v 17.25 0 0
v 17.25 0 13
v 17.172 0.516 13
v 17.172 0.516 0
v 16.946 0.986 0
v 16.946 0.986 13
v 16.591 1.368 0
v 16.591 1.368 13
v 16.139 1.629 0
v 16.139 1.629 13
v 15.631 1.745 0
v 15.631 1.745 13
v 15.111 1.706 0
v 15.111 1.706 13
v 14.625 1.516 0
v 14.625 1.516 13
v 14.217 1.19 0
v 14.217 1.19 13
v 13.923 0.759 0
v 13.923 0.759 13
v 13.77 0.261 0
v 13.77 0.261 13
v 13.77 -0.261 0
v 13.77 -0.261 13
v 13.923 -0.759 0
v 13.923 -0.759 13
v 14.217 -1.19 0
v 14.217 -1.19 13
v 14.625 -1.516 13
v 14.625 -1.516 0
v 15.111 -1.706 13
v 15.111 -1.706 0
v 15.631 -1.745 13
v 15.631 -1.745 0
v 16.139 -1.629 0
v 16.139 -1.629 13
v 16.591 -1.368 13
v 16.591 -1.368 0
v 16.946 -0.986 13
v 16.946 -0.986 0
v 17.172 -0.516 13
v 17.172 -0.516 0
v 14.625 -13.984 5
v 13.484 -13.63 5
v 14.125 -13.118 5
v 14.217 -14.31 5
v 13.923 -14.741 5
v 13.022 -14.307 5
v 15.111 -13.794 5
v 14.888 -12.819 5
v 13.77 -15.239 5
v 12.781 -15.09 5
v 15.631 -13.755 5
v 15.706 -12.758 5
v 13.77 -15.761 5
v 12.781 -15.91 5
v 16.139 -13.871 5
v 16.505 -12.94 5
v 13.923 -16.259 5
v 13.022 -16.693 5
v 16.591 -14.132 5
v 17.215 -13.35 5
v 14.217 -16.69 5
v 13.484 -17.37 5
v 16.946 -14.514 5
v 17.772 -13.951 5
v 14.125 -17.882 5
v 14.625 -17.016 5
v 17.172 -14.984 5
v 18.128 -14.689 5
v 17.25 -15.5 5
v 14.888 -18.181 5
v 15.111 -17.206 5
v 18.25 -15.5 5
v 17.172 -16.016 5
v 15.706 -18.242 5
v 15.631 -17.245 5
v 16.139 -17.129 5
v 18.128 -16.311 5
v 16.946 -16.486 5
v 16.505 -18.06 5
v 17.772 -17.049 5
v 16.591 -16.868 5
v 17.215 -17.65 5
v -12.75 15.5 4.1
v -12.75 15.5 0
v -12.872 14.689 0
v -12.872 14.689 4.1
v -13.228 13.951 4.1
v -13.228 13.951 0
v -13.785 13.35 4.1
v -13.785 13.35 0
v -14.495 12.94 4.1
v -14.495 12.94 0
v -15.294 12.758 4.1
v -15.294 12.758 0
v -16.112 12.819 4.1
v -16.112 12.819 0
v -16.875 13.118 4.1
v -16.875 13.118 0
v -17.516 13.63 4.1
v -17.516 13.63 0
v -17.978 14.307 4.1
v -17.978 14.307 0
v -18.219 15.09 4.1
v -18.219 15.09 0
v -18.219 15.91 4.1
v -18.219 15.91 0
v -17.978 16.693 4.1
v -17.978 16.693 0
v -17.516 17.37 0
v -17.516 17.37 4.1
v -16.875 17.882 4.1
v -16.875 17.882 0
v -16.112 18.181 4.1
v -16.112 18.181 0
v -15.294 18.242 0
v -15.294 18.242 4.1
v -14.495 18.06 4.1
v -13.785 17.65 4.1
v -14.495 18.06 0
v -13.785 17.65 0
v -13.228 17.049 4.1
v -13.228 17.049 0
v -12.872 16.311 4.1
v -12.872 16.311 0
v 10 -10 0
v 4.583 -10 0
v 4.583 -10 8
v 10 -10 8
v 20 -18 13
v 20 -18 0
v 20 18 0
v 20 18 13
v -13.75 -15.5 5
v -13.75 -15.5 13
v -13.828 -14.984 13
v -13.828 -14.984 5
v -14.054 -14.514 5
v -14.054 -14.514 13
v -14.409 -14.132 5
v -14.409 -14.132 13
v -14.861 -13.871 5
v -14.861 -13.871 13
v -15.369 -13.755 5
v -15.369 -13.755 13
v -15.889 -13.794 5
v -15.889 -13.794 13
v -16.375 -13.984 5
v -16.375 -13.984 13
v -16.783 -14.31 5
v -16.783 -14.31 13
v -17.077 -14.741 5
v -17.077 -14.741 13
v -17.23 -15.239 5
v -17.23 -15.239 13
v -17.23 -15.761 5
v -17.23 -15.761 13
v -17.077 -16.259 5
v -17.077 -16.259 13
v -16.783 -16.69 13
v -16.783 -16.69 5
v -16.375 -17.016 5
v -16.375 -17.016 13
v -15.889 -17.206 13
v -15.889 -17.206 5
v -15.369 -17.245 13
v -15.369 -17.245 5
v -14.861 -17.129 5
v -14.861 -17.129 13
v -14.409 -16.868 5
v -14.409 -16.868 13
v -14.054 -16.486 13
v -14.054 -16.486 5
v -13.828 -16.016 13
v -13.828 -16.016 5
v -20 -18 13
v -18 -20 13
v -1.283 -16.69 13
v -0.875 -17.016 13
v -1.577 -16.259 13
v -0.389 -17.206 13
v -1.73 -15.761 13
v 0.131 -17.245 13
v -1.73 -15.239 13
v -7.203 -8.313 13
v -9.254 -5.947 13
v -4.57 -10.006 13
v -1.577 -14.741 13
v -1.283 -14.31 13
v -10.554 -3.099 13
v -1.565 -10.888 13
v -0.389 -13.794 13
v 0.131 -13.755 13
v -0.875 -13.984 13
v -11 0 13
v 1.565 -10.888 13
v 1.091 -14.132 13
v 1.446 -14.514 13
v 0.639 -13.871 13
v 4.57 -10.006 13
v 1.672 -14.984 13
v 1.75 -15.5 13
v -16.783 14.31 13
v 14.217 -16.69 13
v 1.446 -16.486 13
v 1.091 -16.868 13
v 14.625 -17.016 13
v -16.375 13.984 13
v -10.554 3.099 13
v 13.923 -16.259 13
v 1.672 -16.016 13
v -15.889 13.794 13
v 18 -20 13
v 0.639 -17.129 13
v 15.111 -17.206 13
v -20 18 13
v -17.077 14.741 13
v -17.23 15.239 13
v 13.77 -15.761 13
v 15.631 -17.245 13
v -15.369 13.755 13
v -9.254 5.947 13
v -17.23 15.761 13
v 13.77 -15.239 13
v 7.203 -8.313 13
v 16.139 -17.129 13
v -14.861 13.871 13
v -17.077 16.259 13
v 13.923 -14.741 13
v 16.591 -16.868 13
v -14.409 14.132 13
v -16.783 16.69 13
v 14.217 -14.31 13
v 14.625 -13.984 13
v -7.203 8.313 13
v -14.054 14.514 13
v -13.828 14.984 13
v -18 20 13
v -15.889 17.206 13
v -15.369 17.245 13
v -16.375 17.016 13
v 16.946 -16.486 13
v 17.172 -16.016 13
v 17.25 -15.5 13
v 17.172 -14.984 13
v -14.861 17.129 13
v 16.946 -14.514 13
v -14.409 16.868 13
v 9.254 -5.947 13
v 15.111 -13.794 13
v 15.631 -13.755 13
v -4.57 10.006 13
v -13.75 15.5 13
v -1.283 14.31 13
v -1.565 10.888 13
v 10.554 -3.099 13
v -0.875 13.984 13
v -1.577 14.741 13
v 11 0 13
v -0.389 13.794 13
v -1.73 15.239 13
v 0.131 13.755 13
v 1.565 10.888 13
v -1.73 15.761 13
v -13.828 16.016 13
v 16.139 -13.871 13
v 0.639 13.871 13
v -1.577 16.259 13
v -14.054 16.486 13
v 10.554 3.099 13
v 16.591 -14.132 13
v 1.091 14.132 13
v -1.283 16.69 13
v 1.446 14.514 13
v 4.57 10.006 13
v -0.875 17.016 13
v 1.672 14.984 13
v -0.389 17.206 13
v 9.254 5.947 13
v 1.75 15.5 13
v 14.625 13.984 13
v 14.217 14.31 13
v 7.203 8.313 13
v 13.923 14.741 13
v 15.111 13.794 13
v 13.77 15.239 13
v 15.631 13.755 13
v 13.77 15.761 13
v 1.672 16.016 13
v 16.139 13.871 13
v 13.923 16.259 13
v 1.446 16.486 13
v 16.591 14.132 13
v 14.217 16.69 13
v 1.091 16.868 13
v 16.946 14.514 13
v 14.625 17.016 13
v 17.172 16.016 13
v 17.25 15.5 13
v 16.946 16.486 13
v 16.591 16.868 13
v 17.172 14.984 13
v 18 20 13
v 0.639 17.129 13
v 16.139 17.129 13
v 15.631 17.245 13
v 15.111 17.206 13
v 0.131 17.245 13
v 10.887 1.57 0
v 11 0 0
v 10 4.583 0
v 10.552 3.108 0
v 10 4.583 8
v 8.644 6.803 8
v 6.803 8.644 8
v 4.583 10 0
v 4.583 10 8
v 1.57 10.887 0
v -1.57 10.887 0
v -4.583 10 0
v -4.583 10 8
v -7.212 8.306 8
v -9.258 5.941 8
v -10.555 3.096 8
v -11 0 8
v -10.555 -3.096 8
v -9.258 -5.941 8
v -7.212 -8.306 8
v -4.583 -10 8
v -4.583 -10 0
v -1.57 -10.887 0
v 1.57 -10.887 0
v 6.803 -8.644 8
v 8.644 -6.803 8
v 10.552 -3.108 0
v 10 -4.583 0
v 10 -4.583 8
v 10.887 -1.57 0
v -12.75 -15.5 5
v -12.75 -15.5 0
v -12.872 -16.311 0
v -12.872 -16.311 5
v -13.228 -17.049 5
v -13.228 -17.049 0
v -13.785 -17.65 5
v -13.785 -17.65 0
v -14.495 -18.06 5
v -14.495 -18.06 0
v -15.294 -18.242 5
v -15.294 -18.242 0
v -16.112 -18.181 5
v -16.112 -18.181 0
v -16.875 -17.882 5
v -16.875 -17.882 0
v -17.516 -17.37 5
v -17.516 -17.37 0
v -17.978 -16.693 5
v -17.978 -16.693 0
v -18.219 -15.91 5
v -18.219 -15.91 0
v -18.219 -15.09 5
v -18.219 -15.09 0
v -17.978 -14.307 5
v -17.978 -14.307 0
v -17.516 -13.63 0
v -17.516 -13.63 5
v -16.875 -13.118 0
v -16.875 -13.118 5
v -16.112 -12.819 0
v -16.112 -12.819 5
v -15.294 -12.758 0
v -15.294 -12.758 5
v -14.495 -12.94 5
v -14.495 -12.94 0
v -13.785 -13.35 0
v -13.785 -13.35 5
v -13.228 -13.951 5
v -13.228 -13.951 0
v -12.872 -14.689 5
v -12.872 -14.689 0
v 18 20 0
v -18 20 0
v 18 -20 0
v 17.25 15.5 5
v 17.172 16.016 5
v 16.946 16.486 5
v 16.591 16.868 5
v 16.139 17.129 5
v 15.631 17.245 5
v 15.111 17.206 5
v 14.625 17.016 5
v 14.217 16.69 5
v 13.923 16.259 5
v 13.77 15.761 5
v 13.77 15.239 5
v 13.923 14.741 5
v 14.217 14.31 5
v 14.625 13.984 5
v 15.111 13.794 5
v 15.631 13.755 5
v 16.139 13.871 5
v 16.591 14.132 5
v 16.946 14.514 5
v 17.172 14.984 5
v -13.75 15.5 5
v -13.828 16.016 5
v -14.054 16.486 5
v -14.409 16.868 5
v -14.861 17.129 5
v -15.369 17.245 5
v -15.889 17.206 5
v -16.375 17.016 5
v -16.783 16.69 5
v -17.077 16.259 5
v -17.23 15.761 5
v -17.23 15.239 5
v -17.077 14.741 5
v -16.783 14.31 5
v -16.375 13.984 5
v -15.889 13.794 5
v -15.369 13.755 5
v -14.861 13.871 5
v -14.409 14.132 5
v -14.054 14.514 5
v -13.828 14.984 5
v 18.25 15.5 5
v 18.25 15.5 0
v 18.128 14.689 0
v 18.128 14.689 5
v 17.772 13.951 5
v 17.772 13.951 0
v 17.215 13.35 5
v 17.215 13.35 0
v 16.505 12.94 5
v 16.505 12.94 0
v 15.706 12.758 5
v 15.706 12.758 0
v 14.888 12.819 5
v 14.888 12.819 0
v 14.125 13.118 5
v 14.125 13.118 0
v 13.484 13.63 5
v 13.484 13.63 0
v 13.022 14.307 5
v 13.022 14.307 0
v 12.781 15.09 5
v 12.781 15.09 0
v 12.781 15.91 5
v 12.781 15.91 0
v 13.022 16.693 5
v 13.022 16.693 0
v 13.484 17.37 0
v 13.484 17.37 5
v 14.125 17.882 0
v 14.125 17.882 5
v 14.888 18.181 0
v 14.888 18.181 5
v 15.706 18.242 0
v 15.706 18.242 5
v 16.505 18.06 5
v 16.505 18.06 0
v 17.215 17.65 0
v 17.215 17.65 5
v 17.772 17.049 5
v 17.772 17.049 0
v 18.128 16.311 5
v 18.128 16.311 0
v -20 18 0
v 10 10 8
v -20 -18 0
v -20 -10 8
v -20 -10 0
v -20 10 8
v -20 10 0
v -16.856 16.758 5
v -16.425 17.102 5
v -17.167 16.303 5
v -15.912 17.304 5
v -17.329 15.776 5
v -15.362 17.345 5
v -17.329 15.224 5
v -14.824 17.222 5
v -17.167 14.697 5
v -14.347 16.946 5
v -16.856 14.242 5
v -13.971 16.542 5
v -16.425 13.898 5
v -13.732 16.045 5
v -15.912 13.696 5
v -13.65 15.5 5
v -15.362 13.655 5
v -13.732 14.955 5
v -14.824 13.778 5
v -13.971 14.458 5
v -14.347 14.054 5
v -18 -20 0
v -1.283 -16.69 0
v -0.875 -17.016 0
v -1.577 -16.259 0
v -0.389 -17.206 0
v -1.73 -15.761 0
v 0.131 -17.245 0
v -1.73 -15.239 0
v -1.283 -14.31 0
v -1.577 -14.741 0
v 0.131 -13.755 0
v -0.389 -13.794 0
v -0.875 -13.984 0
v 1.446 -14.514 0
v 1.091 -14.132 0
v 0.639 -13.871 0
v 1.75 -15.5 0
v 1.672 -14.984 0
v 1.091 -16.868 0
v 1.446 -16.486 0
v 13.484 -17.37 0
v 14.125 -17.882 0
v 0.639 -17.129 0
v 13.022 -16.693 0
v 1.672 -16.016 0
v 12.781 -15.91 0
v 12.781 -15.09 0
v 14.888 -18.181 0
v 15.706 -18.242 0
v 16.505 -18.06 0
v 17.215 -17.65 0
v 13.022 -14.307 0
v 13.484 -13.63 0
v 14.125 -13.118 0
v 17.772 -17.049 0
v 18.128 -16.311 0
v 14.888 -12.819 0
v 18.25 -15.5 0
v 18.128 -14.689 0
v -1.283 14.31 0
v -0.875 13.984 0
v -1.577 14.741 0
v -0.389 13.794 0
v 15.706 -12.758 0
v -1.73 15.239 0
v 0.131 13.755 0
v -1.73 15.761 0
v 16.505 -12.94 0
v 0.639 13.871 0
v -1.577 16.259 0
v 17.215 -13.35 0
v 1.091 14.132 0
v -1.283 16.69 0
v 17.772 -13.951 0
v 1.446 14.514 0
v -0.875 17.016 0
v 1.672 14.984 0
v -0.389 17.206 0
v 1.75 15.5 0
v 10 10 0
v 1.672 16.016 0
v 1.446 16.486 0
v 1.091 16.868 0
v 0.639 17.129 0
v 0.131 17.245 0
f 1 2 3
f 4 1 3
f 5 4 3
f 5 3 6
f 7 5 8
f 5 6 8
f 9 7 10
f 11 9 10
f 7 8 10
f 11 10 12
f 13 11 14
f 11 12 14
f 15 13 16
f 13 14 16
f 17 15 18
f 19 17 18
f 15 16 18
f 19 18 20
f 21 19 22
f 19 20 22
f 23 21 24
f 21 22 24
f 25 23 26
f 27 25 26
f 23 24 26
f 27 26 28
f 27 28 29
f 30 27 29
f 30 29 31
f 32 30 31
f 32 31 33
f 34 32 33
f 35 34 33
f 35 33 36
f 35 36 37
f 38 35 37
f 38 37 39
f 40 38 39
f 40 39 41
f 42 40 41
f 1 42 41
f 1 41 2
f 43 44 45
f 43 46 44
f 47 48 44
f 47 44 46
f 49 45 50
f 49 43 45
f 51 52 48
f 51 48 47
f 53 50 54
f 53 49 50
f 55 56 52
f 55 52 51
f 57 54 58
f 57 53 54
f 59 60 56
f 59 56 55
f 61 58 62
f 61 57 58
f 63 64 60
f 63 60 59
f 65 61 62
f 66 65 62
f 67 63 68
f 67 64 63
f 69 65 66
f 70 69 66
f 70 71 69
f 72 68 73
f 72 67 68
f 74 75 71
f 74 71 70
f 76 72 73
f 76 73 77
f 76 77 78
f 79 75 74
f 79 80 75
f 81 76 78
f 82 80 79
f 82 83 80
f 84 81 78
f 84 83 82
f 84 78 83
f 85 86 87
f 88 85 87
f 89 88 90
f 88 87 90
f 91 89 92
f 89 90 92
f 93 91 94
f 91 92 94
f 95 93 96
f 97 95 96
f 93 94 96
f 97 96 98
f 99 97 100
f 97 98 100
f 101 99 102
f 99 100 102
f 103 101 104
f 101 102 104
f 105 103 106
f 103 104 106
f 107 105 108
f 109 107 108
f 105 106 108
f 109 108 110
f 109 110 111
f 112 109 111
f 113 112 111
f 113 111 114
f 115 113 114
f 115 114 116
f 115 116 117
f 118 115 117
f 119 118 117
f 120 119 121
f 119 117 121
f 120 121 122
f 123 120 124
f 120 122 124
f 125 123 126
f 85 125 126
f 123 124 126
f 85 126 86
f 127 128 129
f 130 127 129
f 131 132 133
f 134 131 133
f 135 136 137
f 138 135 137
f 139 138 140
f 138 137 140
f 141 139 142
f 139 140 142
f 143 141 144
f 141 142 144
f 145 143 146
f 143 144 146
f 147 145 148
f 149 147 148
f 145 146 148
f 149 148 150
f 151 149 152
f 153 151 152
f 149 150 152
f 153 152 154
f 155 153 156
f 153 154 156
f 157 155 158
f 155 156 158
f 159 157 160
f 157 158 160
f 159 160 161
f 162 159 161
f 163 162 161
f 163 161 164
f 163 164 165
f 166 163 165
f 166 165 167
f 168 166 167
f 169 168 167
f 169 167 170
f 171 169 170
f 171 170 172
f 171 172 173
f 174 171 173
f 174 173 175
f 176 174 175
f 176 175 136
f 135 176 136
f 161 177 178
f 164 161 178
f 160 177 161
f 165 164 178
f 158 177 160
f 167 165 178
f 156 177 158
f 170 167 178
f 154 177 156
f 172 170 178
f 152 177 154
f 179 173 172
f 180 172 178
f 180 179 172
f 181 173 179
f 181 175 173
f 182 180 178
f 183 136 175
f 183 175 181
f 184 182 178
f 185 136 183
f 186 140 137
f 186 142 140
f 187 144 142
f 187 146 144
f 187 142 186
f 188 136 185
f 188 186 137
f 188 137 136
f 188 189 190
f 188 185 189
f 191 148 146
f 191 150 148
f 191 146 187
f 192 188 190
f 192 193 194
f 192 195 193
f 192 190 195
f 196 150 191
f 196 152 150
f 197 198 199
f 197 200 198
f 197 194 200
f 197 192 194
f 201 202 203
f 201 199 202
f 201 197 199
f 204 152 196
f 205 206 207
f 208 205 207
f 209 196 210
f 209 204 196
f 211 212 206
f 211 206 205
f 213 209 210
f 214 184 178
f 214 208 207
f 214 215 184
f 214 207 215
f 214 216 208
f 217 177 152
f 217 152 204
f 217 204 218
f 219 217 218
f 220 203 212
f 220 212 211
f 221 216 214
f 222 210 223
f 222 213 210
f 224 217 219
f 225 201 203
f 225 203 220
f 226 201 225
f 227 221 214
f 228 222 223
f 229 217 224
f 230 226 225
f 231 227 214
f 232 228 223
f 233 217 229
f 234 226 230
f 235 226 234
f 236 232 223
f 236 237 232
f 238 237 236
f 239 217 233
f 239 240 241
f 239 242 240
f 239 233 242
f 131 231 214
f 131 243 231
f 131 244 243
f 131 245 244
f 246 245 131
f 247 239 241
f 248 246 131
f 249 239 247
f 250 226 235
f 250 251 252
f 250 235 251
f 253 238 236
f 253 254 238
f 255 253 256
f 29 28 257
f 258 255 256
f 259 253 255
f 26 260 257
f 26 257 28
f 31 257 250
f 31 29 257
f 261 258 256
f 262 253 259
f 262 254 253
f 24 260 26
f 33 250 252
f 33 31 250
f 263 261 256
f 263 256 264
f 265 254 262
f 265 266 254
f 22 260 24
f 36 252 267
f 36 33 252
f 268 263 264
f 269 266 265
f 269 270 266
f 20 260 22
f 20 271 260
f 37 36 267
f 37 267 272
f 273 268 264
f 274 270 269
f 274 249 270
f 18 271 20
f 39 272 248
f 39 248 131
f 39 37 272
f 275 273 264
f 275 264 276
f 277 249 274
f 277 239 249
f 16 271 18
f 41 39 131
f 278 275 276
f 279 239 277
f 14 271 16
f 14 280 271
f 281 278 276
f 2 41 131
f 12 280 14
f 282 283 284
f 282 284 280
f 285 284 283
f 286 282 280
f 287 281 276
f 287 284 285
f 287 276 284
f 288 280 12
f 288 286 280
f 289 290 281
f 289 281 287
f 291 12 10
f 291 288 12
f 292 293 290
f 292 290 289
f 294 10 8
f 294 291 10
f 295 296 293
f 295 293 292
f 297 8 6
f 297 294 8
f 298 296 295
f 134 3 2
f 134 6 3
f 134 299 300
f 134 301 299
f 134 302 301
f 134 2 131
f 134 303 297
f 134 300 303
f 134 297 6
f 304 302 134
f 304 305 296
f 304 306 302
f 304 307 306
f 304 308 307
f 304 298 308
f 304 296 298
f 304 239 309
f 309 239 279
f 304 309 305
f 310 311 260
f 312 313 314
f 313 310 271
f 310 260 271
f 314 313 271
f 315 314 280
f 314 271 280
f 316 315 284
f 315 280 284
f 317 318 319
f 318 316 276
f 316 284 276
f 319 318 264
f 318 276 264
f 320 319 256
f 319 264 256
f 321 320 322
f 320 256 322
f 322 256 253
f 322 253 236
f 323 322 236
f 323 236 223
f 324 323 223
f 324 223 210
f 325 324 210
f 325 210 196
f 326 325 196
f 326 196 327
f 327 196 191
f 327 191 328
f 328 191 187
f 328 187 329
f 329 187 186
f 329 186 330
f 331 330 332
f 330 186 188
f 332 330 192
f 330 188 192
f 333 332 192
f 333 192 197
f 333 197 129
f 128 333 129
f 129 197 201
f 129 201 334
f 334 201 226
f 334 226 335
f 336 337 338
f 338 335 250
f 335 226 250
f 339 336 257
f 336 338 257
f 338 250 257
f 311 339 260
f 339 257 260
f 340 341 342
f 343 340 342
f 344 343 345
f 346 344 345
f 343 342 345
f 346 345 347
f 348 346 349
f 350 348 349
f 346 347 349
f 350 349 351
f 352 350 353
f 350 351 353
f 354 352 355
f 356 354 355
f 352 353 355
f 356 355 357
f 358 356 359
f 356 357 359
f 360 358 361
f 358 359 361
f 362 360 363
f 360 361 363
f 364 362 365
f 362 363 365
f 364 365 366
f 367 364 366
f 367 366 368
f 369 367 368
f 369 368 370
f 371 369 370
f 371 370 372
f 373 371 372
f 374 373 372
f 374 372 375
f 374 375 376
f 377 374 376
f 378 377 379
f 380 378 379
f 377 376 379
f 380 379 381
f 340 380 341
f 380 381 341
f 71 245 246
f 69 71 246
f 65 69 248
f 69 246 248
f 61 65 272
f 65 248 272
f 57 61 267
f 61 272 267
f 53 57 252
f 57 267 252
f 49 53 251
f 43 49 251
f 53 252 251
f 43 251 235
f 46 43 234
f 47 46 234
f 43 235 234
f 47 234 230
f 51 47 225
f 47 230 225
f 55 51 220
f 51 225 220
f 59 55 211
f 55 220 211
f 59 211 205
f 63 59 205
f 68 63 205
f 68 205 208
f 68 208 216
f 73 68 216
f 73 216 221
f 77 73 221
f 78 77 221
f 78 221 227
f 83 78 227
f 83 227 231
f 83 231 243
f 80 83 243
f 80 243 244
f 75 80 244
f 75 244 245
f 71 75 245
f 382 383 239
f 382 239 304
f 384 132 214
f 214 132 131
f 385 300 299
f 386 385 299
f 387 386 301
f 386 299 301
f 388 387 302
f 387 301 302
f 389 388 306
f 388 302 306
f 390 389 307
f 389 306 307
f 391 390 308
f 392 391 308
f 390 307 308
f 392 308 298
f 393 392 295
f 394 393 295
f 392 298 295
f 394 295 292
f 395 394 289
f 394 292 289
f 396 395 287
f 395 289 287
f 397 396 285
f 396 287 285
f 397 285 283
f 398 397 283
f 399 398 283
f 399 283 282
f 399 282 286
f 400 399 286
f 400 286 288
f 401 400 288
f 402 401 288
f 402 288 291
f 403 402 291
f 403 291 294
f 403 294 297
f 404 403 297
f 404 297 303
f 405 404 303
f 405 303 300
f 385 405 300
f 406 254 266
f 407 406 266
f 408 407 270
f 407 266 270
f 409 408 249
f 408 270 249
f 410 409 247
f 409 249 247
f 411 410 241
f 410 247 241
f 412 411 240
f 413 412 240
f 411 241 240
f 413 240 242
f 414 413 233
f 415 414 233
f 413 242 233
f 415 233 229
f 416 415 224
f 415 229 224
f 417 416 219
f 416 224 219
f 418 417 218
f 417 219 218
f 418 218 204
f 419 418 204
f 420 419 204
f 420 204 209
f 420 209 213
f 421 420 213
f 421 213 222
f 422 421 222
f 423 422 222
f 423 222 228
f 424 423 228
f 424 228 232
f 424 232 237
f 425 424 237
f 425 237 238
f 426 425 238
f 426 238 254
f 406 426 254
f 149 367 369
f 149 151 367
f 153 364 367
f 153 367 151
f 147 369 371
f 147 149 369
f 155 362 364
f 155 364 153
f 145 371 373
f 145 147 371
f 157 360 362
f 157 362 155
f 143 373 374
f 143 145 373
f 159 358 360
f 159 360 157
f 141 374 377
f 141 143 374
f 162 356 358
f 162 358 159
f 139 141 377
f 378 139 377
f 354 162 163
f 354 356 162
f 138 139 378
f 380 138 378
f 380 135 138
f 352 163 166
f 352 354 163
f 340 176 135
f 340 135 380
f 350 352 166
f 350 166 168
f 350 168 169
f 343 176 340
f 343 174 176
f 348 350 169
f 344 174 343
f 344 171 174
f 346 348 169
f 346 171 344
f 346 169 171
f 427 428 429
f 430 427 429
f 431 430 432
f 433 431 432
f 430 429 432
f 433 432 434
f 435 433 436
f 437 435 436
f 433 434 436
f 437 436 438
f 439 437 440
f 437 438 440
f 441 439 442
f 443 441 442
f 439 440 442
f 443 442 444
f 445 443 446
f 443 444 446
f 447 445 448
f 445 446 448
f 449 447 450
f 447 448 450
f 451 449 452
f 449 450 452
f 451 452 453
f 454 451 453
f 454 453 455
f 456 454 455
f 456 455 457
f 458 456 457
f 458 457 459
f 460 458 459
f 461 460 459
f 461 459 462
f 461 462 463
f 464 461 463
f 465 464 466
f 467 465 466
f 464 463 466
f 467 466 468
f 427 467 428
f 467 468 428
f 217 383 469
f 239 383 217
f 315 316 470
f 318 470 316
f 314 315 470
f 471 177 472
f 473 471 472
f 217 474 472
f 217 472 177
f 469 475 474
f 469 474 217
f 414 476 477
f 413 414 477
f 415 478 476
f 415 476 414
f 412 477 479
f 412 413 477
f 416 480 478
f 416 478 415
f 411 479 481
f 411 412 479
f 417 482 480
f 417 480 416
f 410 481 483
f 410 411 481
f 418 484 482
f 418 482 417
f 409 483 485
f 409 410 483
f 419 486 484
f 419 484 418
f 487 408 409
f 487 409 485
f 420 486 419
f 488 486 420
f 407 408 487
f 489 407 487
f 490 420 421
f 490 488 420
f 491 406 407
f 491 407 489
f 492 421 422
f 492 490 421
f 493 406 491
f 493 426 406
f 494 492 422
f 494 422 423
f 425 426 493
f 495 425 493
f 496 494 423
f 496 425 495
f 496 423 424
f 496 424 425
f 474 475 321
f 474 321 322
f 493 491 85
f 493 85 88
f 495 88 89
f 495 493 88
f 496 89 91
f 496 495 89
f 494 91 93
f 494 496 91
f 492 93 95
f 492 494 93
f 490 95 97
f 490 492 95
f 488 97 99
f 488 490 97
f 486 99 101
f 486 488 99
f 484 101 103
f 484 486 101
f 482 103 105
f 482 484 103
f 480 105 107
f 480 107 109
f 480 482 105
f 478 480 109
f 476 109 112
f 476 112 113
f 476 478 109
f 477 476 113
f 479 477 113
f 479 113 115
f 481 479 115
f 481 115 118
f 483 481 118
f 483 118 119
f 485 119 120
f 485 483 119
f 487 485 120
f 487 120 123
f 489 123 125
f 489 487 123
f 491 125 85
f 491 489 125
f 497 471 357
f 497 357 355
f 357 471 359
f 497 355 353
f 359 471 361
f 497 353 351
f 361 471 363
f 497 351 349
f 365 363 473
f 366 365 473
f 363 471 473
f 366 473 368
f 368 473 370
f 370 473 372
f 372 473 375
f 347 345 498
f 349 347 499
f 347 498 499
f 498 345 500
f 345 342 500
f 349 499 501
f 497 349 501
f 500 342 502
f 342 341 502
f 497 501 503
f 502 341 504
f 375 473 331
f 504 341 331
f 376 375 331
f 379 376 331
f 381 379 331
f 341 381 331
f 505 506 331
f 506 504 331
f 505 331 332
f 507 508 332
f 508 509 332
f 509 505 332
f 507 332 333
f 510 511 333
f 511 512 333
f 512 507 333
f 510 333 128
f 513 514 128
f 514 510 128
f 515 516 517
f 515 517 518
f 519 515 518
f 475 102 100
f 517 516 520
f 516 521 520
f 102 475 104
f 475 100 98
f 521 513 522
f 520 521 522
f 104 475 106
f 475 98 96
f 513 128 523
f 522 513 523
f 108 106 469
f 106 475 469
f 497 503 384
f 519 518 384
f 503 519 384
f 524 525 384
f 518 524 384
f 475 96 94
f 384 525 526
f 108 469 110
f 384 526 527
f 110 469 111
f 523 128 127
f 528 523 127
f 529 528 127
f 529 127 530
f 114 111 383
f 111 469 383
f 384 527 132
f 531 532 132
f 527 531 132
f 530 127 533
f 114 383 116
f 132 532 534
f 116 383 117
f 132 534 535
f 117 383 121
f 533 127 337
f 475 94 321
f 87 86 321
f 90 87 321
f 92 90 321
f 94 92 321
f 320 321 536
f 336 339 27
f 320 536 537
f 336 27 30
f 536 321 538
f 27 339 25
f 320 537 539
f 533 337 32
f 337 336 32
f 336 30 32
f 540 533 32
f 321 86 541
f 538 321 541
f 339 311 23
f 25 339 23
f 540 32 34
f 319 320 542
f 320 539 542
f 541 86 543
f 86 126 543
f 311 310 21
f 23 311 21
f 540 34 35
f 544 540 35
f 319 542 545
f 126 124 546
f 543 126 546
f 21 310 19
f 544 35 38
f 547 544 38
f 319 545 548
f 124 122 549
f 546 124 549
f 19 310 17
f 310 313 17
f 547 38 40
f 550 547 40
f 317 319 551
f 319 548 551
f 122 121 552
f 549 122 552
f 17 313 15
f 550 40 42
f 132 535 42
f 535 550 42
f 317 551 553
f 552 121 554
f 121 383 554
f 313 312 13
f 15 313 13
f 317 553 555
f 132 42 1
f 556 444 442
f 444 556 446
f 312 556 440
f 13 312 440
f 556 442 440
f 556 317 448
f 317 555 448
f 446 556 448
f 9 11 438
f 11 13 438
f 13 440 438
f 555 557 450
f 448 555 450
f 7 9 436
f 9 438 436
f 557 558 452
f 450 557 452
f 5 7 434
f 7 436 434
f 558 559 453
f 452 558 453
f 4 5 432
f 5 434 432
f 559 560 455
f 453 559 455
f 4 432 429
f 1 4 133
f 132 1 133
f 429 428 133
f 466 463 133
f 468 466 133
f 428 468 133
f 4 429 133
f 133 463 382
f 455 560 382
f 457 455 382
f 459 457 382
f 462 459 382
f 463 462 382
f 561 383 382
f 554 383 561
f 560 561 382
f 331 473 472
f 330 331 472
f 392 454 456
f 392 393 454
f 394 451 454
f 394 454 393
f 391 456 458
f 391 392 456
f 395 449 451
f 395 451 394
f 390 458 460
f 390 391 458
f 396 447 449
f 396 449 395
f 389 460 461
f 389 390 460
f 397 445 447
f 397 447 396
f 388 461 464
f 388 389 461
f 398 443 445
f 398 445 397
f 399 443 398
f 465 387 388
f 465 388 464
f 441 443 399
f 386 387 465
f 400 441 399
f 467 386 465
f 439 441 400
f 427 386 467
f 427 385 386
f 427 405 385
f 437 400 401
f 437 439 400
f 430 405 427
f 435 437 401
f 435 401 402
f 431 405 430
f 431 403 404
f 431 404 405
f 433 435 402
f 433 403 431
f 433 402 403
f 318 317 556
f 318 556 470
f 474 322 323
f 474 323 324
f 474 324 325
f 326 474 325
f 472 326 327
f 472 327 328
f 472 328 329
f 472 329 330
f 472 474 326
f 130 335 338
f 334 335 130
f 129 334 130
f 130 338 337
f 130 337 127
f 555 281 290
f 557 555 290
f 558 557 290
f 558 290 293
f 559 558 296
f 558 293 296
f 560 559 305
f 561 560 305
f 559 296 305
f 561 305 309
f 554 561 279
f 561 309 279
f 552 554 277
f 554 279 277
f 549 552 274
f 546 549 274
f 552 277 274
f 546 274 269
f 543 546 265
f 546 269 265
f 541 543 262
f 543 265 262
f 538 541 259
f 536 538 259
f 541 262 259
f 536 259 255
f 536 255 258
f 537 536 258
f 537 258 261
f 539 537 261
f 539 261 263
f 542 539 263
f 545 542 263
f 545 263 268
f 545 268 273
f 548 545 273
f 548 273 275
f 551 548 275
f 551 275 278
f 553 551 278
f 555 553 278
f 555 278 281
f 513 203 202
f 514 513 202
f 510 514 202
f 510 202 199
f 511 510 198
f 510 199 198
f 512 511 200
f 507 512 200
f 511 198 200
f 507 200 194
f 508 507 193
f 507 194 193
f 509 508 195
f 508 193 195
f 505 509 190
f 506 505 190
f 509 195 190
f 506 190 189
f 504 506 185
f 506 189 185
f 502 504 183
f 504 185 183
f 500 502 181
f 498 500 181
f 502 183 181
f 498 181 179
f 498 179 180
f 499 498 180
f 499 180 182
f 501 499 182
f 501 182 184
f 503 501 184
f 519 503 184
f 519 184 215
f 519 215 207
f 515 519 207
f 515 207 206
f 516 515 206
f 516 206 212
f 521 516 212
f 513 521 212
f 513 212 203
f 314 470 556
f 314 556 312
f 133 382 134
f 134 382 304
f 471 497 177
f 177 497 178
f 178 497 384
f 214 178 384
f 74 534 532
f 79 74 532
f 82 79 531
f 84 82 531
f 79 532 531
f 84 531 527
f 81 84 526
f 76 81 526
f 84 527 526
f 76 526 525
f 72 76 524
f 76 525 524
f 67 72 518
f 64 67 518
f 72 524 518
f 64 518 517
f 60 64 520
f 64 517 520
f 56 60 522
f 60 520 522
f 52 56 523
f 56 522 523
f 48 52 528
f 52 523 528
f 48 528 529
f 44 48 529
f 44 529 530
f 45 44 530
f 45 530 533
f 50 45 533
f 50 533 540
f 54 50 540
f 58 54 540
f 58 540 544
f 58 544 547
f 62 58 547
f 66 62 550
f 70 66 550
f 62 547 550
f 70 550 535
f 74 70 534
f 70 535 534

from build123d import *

# Parameters (mm, degrees)
SKETCH013_W     = 40
SKETCH013_H     = 40
PAD002_DEPTH    = 13
SKETCH014_W     = 20
SKETCH014_H     = 19.786463
POCKET008_DEPTH = 30
SKETCH015_R     = 11
POCKET009_DEPTH = 13.001
SKETCH017_R     = 1.75
POCKET010_DEPTH = 13.001
SKETCH018_R     = 1.9
POCKET011_DEPTH = 5
SKETCH019_R     = 2.75
POCKET012_DEPTH = 5
CHAMFER002_SIZE = 0.9
CHAMFER005_SIZE = 2


with BuildPart() as part:
    # Sketch013 → Pad002 (new body)
    with BuildSketch(Plane.XY):
        Rectangle(SKETCH013_W, SKETCH013_H)
    extrude(amount=PAD002_DEPTH)

    # Sketch014 (on Face4 of Pad002) → Pocket008 (cut)
    with BuildSketch(Plane(origin=(-20, 0, 0), x_dir=(0, -1, 0), z_dir=(-1, 0, 0))):
        with Locations((0, -1.893231)):
            Rectangle(SKETCH014_W, SKETCH014_H)
    extrude(amount=-POCKET008_DEPTH, mode=Mode.SUBTRACT)

    # Sketch015 (on Face5 of Pocket008) → Pocket009 (cut, through all)
    with BuildSketch(Plane.XY.offset(13)):
        Circle(SKETCH015_R)
    extrude(amount=-POCKET009_DEPTH, mode=Mode.SUBTRACT)

    # Sketch017 (on Face5 of Pocket009) → Pocket010 (cut, through all)
    with BuildSketch(Plane.XY.offset(13)):
        with Locations((0, 15.5)):
            Circle(SKETCH017_R)
        with Locations((15.5, 0)):
            Circle(SKETCH017_R)
        with Locations((0, -15.5)):
            Circle(SKETCH017_R)
        with Locations((-15.5, 15.5)):
            Circle(SKETCH017_R)
        with Locations((15.5, 15.5)):
            Circle(SKETCH017_R)
        with Locations((-15.5, -15.5)):
            Circle(SKETCH017_R)
        with Locations((15.5, -15.5)):
            Circle(SKETCH017_R)
    extrude(amount=-POCKET010_DEPTH, mode=Mode.SUBTRACT)

    # Sketch018 → Pocket011 (cut)
    with BuildSketch(Plane.XY.offset(20)):
        with Locations((0, 15.5)):
            Circle(SKETCH018_R)
        with Locations((15.5, 0)):
            Circle(SKETCH018_R)
        with Locations((0, -15.5)):
            Circle(SKETCH018_R)
    extrude(amount=-POCKET011_DEPTH, mode=Mode.SUBTRACT)

    # Sketch019 → Pocket012 (cut)
    with BuildSketch(Plane(origin=(0, 0, 0), x_dir=(1, 0, 0), z_dir=(0, 0, -1))):
        with Locations((-15.5, 15.5)):
            Circle(SKETCH019_R)
        with Locations((15.5, 15.5)):
            Circle(SKETCH019_R)
        with Locations((15.5, -15.5)):
            Circle(SKETCH019_R)
        with Locations((-15.5, -15.5)):
            Circle(SKETCH019_R)
    extrude(amount=-POCKET012_DEPTH, mode=Mode.SUBTRACT)

    # Chamfer002
    chamfer002_edges = [part.edges().sort_by_distance(p)[0] for p in [
        (1.75, -15.5, 6.5),
        (-18.25, 15.5, 5),
        (18.25, 15.5, 2.5),
    ]]
    chamfer(chamfer002_edges, length=CHAMFER002_SIZE)

    # Chamfer005
    chamfer005_edges = [part.edges().sort_by_distance(p)[0] for p in [
        (-20, 20, 6.5),
        (20, 20, 6.5),
        (20, -20, 6.5),
        (-20, -20, 6.5),
    ]]
    chamfer(chamfer005_edges, length=CHAMFER005_SIZE)


solid = part.part
